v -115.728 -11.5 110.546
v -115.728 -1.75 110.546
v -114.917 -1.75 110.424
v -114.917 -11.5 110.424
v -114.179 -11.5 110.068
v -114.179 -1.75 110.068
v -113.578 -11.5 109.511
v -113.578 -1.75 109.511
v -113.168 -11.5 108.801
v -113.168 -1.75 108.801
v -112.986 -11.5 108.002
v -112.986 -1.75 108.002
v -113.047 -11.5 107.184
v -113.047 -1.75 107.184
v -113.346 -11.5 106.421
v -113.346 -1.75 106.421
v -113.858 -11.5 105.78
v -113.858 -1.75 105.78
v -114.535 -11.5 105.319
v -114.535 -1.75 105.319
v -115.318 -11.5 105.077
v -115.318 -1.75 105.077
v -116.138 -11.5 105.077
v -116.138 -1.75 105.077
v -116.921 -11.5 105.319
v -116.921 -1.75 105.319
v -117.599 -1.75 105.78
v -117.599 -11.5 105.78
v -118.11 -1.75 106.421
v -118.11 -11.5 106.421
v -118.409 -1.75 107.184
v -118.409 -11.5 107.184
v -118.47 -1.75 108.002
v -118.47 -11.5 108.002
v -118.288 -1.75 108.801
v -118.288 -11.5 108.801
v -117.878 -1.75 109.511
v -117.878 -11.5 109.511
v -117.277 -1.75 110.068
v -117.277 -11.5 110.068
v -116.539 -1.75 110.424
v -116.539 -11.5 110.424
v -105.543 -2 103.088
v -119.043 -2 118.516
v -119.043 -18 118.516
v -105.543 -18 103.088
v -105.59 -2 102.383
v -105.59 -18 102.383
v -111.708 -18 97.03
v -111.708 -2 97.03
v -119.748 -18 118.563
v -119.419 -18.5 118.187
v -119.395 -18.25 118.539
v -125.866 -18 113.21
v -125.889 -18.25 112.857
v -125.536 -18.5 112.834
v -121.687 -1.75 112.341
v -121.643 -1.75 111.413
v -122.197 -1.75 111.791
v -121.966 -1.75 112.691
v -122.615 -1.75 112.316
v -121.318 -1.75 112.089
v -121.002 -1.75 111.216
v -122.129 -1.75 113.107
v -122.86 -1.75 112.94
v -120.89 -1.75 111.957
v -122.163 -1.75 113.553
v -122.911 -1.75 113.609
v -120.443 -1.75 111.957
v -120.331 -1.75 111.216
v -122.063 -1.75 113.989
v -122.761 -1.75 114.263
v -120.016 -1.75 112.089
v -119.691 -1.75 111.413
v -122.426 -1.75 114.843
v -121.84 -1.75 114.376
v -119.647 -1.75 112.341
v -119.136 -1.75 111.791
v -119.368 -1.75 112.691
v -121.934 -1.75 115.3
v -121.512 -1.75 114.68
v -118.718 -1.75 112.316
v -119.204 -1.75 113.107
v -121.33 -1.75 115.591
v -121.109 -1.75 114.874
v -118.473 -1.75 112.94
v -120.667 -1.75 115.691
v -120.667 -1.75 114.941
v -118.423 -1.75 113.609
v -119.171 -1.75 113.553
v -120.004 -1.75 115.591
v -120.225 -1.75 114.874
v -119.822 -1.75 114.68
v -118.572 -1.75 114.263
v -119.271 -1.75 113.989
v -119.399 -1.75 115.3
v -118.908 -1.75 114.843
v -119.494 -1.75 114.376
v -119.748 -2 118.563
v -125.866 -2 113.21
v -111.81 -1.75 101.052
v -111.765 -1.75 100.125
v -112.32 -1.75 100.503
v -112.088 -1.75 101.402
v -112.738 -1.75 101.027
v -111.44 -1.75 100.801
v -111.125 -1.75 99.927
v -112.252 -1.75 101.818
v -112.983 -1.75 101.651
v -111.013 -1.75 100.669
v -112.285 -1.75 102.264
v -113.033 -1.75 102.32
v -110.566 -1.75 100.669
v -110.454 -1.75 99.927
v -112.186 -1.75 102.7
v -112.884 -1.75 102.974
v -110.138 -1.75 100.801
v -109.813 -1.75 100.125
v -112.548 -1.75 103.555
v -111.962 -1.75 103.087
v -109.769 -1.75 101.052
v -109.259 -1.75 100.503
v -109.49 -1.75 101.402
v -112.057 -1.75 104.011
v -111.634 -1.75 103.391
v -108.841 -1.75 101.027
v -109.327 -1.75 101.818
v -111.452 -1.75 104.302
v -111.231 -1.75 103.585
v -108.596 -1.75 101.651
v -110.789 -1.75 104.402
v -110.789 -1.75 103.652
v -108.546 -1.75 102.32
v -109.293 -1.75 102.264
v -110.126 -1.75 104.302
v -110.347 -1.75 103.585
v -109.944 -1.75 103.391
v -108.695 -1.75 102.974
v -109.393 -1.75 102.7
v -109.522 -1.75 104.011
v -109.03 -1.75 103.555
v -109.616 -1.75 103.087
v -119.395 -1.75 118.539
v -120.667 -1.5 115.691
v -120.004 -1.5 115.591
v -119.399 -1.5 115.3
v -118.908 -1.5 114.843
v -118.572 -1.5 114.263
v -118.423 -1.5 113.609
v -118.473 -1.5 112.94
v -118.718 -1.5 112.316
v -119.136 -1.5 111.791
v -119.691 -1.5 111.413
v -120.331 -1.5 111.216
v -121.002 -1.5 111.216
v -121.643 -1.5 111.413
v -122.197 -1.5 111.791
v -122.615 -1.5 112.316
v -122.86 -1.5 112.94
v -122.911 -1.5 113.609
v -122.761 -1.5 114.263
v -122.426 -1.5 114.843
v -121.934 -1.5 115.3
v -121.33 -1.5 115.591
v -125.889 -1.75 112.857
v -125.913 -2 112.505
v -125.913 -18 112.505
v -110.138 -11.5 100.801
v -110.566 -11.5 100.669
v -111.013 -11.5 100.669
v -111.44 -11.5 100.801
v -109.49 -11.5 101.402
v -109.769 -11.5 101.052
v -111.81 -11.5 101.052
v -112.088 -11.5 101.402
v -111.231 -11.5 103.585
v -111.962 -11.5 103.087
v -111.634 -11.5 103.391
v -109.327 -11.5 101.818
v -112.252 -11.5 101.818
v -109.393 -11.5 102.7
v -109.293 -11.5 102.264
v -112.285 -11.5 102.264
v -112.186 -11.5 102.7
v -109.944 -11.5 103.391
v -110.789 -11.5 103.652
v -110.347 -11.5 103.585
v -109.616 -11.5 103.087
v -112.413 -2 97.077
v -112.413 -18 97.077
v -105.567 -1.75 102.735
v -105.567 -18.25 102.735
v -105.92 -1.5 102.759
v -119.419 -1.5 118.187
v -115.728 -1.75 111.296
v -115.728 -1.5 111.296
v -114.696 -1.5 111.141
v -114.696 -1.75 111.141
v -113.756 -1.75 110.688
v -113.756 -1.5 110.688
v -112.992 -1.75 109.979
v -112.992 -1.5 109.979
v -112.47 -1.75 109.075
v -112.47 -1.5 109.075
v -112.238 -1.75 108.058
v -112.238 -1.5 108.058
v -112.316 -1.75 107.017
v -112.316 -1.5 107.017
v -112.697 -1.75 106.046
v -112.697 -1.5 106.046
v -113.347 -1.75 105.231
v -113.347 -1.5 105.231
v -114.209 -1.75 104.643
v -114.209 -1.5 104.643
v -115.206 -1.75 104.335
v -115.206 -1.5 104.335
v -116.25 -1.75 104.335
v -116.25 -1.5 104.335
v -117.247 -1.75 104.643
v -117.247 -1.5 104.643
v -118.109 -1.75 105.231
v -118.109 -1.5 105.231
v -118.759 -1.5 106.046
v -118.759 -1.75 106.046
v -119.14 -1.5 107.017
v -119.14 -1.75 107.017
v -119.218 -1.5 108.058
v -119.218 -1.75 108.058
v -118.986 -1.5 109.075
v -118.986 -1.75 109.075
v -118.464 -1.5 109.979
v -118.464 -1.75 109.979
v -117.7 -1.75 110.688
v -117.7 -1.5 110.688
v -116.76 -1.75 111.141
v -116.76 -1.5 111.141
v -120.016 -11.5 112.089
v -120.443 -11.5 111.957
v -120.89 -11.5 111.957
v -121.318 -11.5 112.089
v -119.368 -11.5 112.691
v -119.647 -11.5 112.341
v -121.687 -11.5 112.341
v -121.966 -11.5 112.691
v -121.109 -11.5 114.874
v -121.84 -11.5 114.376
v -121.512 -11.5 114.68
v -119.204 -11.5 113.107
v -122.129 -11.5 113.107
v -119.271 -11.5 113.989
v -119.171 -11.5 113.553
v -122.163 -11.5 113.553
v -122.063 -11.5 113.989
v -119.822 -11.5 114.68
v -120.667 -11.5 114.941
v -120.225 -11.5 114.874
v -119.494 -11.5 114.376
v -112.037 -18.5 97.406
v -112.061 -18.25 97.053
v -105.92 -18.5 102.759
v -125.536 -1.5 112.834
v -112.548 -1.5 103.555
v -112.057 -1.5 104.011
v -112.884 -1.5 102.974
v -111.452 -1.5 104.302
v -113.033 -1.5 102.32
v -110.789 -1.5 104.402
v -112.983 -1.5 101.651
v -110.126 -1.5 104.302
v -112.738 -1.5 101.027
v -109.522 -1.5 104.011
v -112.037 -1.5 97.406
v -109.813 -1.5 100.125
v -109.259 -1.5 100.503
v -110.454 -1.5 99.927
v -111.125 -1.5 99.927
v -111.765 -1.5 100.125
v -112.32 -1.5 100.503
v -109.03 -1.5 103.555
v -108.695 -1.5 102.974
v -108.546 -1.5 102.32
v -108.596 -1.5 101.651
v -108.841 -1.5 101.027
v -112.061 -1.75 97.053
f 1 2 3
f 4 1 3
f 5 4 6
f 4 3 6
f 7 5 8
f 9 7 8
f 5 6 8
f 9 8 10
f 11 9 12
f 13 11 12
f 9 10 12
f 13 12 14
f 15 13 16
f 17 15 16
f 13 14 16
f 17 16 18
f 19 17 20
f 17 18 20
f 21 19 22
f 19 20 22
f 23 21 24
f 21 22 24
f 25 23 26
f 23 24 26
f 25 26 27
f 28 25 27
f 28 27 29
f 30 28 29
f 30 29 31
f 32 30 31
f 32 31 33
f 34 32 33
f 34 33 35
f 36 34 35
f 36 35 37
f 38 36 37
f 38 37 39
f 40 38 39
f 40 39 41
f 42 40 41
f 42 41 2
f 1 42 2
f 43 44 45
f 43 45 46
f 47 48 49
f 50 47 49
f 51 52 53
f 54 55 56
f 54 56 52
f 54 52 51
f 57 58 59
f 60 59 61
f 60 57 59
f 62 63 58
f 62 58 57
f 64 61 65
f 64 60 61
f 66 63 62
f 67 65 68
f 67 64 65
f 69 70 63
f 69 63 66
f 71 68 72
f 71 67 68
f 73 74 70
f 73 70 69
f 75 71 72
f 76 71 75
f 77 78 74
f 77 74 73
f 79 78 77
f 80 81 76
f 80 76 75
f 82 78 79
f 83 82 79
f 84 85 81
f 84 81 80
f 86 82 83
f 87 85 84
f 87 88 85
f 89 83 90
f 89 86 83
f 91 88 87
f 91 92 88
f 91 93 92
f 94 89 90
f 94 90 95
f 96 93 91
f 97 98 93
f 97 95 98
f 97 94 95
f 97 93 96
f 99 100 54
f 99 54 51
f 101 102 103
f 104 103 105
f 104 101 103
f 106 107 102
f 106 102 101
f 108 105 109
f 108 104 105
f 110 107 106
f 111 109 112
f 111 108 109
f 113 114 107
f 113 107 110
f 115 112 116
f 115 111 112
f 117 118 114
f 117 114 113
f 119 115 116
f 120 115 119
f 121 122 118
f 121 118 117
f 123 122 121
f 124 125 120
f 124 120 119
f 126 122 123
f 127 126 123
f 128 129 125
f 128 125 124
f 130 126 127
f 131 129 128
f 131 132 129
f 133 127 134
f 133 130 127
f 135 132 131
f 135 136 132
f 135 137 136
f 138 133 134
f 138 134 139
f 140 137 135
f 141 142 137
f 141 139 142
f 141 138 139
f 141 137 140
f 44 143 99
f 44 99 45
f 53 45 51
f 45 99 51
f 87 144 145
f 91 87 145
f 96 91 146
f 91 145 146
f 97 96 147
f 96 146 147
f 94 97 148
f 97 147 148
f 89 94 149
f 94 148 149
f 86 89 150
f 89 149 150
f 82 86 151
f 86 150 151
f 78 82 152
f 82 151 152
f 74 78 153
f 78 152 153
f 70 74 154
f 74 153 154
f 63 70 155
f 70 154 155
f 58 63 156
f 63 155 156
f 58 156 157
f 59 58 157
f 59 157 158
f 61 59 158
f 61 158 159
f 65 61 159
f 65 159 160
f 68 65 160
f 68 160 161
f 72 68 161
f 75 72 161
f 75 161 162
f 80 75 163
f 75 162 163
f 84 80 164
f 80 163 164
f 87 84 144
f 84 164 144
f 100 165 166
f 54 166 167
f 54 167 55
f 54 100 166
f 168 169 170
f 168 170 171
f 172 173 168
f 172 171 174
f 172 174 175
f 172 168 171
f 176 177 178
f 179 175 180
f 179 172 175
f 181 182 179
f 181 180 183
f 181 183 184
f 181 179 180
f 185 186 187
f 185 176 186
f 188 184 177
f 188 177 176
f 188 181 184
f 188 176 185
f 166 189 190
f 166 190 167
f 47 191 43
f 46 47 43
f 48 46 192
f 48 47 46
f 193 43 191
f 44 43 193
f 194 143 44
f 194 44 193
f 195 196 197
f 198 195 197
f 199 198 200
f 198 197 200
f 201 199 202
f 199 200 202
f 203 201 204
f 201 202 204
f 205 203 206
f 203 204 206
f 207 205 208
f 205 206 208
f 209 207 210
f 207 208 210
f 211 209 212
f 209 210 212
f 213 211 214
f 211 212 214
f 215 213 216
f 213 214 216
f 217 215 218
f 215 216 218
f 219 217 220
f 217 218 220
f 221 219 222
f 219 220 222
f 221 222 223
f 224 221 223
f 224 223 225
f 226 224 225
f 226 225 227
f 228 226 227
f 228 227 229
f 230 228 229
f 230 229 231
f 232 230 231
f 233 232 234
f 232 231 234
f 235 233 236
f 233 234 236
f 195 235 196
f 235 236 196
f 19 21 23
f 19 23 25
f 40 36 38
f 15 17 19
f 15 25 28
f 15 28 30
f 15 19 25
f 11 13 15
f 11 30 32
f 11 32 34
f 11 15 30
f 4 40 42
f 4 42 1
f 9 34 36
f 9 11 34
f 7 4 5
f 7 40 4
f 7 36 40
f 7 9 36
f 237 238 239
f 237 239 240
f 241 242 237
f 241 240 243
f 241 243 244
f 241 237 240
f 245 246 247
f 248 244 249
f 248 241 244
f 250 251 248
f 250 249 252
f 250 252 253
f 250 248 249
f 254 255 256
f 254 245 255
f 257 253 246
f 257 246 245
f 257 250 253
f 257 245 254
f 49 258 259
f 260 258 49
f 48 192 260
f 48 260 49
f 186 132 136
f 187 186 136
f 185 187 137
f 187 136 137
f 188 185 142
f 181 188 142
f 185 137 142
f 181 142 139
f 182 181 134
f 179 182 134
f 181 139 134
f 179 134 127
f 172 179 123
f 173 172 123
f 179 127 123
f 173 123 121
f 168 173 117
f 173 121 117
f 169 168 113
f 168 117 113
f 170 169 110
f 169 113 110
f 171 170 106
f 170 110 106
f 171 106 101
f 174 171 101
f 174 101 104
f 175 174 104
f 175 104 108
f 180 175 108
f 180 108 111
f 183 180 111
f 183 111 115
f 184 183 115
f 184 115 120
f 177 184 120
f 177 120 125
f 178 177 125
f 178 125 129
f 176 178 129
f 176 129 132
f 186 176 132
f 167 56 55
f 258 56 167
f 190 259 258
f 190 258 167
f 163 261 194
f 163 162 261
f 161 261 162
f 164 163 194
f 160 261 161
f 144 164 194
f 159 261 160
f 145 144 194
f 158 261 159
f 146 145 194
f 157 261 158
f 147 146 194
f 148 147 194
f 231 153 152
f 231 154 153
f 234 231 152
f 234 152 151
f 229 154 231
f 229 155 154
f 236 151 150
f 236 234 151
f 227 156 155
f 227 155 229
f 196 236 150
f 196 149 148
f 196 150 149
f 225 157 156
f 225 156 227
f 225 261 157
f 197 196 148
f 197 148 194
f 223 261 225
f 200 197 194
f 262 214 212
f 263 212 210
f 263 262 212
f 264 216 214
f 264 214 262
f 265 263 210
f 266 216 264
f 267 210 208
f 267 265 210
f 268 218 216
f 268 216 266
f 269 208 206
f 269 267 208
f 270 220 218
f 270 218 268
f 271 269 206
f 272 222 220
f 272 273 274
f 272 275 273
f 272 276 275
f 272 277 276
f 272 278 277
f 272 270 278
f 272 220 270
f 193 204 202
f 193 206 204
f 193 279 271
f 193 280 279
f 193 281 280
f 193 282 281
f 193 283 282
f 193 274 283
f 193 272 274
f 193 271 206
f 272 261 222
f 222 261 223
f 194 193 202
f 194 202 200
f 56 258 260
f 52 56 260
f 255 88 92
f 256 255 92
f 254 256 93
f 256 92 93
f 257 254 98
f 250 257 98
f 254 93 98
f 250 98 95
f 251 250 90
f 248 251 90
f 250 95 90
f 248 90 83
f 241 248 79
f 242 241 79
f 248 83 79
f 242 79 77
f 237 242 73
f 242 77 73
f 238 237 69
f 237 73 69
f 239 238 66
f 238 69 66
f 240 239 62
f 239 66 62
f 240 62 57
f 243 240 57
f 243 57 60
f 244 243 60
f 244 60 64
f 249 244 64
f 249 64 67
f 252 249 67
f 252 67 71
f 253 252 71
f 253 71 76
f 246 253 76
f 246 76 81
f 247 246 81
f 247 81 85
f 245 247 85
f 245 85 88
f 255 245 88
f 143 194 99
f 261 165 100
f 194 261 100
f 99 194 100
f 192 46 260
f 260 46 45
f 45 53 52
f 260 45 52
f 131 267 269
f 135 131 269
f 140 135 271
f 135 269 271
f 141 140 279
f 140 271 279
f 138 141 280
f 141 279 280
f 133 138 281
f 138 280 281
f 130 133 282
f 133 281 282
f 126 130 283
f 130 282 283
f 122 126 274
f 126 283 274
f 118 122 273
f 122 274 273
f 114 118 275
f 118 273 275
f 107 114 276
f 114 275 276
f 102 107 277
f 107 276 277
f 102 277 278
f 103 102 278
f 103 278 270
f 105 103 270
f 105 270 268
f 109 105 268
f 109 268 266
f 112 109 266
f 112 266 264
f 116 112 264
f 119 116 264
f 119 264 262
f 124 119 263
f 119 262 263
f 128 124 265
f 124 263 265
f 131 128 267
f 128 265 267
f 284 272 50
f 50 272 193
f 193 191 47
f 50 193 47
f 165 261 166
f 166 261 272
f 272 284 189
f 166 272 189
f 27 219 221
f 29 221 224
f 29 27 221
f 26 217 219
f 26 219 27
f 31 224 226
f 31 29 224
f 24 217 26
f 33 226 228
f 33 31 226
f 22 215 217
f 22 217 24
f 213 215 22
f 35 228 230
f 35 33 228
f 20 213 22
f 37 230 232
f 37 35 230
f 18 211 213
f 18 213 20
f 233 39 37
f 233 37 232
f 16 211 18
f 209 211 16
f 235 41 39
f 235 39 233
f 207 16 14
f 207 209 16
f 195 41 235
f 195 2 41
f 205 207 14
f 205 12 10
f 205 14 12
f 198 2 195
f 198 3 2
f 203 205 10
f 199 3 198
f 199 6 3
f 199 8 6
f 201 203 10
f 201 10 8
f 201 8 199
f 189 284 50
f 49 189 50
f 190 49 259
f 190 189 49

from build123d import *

# Parameters (mm, degrees)
BOSS_EXTRUDE1_START = -1.5
BOSS_EXTRUDE1_DEPTH = 17
CHAMFER1_SIZE       = 0.5
CHAMFER2_SIZE       = 0.5
SKETCH3_R           = 2.25
SKETCH3_R_2         = 3.5
CUT_EXTRUDE1_DEPTH  = 0.25
SKETCH4_R           = 1.5
SKETCH4_R_2         = 2.75
CUT_EXTRUDE2_DEPTH  = 10


with BuildPart() as part:
    # Sketch1 → Boss-Extrude1 (new body)
    with BuildSketch(Plane(origin=(0, 0, 0), x_dir=(1, 0, 0), z_dir=(0, 1, 0)).offset(BOSS_EXTRUDE1_START)):
        Polygon((-119.371877221, -118.892211925), (-105.214028152, -102.711812989), (-112.084182588, -96.700427857), (-126.242031658, -112.880826794), align=None)
    extrude(amount=-BOSS_EXTRUDE1_DEPTH)

    # Chamfer1
    chamfer1_edges = [part.edges().sort_by_distance(p)[0] for p in [
        (-119.371877221, -10, 118.892211925),
        (-105.214028152, -10, 102.711812989),
        (-112.084182588, -10, 96.700427857),
        (-126.242031658, -10, 112.880826794),
    ]]
    chamfer(chamfer1_edges, length=CHAMFER1_SIZE)

    # Chamfer2
    # the kernel refuses this chamfer: 0.5 mm, written as the material it takes off along each edge
    with BuildSketch(Plane(origin=(-104.622622158, -18.5, 103.229293234), x_dir=(-0.6582556384124536, -0.027495876610589123, 0.7522921581856536), z_dir=(-0.7525766947068745, 0, -0.6585046078685219)), Plane(origin=(-126.833437652, -18.5, 112.363346549), x_dir=(0.6582556384124544, -0.027495876610588624, -0.752292158185653), z_dir=(0.7525766947068739, 0, 0.6585046078685227))) as chamfer2_piece_1:
        Polygon((CHAMFER2_SIZE * 0.999621916911, CHAMFER2_SIZE * 0.0274958766106), (-CHAMFER2_SIZE * 0.0274958766106, CHAMFER2_SIZE * 0.999621916911), (0, 0), align=None)
    extrude(amount=10.700525914, mode=Mode.SUBTRACT)
    with BuildSketch(Plane(origin=(-111.566702344, -18.5, 96.109021863), x_dir=(0.7522921581856542, -0.027495876610589123, 0.6582556384124529), z_dir=(-0.6585046078685213, 0, 0.7525766947068752)), Plane(origin=(-119.889357466, -1.5, 119.483617919), x_dir=(0.02069275593768218, -0.9996219169112961, 0.018106161445472113), z_dir=(0.6585046078685223, 0, -0.7525766947068742))) as chamfer2_piece_2:
        Polygon((CHAMFER2_SIZE * 0.999621916911, CHAMFER2_SIZE * 0.0274958766106), (-CHAMFER2_SIZE * 0.0274958766106, CHAMFER2_SIZE * 0.999621916911), (0, 0), align=None)
    extrude(amount=23.071682988, mode=Mode.SUBTRACT)
    with BuildSketch(Plane(origin=(-119.889357466, -18.5, 119.483617919), x_dir=(0.020692755937682127, 0.9996219169112961, 0.018106161445472065), z_dir=(0.6585046078685223, 0, -0.7525766947068742)), Plane(origin=(-111.566702344, -1.5, 96.109021863), x_dir=(0.7522921581856542, 0.027495876610586535, 0.6582556384124529), z_dir=(-0.6585046078685213, 0, 0.7525766947068752))) as chamfer2_piece_3:
        Polygon((CHAMFER2_SIZE * 0.999621916911, -CHAMFER2_SIZE * 0.0274958766106), (-CHAMFER2_SIZE * 0.0274958766106, -CHAMFER2_SIZE * 0.999621916911), (0, 0), align=None)
    extrude(amount=23.071682988, mode=Mode.SUBTRACT)
    with BuildSketch(Plane(origin=(-104.622622158, -1.5, 103.229293234), x_dir=(-0.6582556384124536, 0.027495876610586965, 0.7522921581856536), z_dir=(-0.7525766947068745, 0, -0.6585046078685219)), Plane(origin=(-126.833437652, -1.5, 112.363346549), x_dir=(0.6582556384124544, 0.027495876610586036, -0.752292158185653), z_dir=(0.7525766947068739, 0, 0.6585046078685227))) as chamfer2_piece_4:
        Polygon((CHAMFER2_SIZE * 0.999621916911, -CHAMFER2_SIZE * 0.0274958766106), (-CHAMFER2_SIZE * 0.0274958766106, -CHAMFER2_SIZE * 0.999621916911), (0, 0), align=None)
    extrude(amount=10.700525914, mode=Mode.SUBTRACT)

    # Sketch3 → Cut-Extrude1 (cut)
    with BuildSketch(Plane(origin=(0, -1.5, 0), x_dir=(1, 0, 0), z_dir=(0, 1, 0))):
        with Locations(Location((-110.789245346, -102.151994681, 0), (0, 0, 270))):
            Circle(SKETCH3_R)
        with Locations(Location((-115.728029905, -107.796319891, 0), (0, 0, 270))):
            Circle(SKETCH3_R_2)
        with Locations(Location((-120.666814464, -113.440645102, 0), (0, 0, 270))):
            Circle(SKETCH3_R)
    extrude(amount=-CUT_EXTRUDE1_DEPTH, mode=Mode.SUBTRACT)

    # Sketch4 → Cut-Extrude2 (cut)
    with BuildSketch(Plane(origin=(0, -1.5, 0), x_dir=(1, 0, 0), z_dir=(0, 1, 0))):
        with Locations(Location((-110.789245346, -102.151994681, 0), (0, 0, 270))):
            Circle(SKETCH4_R)
        with Locations(Location((-115.728029905, -107.796319891, 0), (0, 0, 270))):
            Circle(SKETCH4_R_2)
        with Locations(Location((-120.666814464, -113.440645102, 0), (0, 0, 270))):
            Circle(SKETCH4_R)
    extrude(amount=-CUT_EXTRUDE2_DEPTH, mode=Mode.SUBTRACT)


solid = part.part
